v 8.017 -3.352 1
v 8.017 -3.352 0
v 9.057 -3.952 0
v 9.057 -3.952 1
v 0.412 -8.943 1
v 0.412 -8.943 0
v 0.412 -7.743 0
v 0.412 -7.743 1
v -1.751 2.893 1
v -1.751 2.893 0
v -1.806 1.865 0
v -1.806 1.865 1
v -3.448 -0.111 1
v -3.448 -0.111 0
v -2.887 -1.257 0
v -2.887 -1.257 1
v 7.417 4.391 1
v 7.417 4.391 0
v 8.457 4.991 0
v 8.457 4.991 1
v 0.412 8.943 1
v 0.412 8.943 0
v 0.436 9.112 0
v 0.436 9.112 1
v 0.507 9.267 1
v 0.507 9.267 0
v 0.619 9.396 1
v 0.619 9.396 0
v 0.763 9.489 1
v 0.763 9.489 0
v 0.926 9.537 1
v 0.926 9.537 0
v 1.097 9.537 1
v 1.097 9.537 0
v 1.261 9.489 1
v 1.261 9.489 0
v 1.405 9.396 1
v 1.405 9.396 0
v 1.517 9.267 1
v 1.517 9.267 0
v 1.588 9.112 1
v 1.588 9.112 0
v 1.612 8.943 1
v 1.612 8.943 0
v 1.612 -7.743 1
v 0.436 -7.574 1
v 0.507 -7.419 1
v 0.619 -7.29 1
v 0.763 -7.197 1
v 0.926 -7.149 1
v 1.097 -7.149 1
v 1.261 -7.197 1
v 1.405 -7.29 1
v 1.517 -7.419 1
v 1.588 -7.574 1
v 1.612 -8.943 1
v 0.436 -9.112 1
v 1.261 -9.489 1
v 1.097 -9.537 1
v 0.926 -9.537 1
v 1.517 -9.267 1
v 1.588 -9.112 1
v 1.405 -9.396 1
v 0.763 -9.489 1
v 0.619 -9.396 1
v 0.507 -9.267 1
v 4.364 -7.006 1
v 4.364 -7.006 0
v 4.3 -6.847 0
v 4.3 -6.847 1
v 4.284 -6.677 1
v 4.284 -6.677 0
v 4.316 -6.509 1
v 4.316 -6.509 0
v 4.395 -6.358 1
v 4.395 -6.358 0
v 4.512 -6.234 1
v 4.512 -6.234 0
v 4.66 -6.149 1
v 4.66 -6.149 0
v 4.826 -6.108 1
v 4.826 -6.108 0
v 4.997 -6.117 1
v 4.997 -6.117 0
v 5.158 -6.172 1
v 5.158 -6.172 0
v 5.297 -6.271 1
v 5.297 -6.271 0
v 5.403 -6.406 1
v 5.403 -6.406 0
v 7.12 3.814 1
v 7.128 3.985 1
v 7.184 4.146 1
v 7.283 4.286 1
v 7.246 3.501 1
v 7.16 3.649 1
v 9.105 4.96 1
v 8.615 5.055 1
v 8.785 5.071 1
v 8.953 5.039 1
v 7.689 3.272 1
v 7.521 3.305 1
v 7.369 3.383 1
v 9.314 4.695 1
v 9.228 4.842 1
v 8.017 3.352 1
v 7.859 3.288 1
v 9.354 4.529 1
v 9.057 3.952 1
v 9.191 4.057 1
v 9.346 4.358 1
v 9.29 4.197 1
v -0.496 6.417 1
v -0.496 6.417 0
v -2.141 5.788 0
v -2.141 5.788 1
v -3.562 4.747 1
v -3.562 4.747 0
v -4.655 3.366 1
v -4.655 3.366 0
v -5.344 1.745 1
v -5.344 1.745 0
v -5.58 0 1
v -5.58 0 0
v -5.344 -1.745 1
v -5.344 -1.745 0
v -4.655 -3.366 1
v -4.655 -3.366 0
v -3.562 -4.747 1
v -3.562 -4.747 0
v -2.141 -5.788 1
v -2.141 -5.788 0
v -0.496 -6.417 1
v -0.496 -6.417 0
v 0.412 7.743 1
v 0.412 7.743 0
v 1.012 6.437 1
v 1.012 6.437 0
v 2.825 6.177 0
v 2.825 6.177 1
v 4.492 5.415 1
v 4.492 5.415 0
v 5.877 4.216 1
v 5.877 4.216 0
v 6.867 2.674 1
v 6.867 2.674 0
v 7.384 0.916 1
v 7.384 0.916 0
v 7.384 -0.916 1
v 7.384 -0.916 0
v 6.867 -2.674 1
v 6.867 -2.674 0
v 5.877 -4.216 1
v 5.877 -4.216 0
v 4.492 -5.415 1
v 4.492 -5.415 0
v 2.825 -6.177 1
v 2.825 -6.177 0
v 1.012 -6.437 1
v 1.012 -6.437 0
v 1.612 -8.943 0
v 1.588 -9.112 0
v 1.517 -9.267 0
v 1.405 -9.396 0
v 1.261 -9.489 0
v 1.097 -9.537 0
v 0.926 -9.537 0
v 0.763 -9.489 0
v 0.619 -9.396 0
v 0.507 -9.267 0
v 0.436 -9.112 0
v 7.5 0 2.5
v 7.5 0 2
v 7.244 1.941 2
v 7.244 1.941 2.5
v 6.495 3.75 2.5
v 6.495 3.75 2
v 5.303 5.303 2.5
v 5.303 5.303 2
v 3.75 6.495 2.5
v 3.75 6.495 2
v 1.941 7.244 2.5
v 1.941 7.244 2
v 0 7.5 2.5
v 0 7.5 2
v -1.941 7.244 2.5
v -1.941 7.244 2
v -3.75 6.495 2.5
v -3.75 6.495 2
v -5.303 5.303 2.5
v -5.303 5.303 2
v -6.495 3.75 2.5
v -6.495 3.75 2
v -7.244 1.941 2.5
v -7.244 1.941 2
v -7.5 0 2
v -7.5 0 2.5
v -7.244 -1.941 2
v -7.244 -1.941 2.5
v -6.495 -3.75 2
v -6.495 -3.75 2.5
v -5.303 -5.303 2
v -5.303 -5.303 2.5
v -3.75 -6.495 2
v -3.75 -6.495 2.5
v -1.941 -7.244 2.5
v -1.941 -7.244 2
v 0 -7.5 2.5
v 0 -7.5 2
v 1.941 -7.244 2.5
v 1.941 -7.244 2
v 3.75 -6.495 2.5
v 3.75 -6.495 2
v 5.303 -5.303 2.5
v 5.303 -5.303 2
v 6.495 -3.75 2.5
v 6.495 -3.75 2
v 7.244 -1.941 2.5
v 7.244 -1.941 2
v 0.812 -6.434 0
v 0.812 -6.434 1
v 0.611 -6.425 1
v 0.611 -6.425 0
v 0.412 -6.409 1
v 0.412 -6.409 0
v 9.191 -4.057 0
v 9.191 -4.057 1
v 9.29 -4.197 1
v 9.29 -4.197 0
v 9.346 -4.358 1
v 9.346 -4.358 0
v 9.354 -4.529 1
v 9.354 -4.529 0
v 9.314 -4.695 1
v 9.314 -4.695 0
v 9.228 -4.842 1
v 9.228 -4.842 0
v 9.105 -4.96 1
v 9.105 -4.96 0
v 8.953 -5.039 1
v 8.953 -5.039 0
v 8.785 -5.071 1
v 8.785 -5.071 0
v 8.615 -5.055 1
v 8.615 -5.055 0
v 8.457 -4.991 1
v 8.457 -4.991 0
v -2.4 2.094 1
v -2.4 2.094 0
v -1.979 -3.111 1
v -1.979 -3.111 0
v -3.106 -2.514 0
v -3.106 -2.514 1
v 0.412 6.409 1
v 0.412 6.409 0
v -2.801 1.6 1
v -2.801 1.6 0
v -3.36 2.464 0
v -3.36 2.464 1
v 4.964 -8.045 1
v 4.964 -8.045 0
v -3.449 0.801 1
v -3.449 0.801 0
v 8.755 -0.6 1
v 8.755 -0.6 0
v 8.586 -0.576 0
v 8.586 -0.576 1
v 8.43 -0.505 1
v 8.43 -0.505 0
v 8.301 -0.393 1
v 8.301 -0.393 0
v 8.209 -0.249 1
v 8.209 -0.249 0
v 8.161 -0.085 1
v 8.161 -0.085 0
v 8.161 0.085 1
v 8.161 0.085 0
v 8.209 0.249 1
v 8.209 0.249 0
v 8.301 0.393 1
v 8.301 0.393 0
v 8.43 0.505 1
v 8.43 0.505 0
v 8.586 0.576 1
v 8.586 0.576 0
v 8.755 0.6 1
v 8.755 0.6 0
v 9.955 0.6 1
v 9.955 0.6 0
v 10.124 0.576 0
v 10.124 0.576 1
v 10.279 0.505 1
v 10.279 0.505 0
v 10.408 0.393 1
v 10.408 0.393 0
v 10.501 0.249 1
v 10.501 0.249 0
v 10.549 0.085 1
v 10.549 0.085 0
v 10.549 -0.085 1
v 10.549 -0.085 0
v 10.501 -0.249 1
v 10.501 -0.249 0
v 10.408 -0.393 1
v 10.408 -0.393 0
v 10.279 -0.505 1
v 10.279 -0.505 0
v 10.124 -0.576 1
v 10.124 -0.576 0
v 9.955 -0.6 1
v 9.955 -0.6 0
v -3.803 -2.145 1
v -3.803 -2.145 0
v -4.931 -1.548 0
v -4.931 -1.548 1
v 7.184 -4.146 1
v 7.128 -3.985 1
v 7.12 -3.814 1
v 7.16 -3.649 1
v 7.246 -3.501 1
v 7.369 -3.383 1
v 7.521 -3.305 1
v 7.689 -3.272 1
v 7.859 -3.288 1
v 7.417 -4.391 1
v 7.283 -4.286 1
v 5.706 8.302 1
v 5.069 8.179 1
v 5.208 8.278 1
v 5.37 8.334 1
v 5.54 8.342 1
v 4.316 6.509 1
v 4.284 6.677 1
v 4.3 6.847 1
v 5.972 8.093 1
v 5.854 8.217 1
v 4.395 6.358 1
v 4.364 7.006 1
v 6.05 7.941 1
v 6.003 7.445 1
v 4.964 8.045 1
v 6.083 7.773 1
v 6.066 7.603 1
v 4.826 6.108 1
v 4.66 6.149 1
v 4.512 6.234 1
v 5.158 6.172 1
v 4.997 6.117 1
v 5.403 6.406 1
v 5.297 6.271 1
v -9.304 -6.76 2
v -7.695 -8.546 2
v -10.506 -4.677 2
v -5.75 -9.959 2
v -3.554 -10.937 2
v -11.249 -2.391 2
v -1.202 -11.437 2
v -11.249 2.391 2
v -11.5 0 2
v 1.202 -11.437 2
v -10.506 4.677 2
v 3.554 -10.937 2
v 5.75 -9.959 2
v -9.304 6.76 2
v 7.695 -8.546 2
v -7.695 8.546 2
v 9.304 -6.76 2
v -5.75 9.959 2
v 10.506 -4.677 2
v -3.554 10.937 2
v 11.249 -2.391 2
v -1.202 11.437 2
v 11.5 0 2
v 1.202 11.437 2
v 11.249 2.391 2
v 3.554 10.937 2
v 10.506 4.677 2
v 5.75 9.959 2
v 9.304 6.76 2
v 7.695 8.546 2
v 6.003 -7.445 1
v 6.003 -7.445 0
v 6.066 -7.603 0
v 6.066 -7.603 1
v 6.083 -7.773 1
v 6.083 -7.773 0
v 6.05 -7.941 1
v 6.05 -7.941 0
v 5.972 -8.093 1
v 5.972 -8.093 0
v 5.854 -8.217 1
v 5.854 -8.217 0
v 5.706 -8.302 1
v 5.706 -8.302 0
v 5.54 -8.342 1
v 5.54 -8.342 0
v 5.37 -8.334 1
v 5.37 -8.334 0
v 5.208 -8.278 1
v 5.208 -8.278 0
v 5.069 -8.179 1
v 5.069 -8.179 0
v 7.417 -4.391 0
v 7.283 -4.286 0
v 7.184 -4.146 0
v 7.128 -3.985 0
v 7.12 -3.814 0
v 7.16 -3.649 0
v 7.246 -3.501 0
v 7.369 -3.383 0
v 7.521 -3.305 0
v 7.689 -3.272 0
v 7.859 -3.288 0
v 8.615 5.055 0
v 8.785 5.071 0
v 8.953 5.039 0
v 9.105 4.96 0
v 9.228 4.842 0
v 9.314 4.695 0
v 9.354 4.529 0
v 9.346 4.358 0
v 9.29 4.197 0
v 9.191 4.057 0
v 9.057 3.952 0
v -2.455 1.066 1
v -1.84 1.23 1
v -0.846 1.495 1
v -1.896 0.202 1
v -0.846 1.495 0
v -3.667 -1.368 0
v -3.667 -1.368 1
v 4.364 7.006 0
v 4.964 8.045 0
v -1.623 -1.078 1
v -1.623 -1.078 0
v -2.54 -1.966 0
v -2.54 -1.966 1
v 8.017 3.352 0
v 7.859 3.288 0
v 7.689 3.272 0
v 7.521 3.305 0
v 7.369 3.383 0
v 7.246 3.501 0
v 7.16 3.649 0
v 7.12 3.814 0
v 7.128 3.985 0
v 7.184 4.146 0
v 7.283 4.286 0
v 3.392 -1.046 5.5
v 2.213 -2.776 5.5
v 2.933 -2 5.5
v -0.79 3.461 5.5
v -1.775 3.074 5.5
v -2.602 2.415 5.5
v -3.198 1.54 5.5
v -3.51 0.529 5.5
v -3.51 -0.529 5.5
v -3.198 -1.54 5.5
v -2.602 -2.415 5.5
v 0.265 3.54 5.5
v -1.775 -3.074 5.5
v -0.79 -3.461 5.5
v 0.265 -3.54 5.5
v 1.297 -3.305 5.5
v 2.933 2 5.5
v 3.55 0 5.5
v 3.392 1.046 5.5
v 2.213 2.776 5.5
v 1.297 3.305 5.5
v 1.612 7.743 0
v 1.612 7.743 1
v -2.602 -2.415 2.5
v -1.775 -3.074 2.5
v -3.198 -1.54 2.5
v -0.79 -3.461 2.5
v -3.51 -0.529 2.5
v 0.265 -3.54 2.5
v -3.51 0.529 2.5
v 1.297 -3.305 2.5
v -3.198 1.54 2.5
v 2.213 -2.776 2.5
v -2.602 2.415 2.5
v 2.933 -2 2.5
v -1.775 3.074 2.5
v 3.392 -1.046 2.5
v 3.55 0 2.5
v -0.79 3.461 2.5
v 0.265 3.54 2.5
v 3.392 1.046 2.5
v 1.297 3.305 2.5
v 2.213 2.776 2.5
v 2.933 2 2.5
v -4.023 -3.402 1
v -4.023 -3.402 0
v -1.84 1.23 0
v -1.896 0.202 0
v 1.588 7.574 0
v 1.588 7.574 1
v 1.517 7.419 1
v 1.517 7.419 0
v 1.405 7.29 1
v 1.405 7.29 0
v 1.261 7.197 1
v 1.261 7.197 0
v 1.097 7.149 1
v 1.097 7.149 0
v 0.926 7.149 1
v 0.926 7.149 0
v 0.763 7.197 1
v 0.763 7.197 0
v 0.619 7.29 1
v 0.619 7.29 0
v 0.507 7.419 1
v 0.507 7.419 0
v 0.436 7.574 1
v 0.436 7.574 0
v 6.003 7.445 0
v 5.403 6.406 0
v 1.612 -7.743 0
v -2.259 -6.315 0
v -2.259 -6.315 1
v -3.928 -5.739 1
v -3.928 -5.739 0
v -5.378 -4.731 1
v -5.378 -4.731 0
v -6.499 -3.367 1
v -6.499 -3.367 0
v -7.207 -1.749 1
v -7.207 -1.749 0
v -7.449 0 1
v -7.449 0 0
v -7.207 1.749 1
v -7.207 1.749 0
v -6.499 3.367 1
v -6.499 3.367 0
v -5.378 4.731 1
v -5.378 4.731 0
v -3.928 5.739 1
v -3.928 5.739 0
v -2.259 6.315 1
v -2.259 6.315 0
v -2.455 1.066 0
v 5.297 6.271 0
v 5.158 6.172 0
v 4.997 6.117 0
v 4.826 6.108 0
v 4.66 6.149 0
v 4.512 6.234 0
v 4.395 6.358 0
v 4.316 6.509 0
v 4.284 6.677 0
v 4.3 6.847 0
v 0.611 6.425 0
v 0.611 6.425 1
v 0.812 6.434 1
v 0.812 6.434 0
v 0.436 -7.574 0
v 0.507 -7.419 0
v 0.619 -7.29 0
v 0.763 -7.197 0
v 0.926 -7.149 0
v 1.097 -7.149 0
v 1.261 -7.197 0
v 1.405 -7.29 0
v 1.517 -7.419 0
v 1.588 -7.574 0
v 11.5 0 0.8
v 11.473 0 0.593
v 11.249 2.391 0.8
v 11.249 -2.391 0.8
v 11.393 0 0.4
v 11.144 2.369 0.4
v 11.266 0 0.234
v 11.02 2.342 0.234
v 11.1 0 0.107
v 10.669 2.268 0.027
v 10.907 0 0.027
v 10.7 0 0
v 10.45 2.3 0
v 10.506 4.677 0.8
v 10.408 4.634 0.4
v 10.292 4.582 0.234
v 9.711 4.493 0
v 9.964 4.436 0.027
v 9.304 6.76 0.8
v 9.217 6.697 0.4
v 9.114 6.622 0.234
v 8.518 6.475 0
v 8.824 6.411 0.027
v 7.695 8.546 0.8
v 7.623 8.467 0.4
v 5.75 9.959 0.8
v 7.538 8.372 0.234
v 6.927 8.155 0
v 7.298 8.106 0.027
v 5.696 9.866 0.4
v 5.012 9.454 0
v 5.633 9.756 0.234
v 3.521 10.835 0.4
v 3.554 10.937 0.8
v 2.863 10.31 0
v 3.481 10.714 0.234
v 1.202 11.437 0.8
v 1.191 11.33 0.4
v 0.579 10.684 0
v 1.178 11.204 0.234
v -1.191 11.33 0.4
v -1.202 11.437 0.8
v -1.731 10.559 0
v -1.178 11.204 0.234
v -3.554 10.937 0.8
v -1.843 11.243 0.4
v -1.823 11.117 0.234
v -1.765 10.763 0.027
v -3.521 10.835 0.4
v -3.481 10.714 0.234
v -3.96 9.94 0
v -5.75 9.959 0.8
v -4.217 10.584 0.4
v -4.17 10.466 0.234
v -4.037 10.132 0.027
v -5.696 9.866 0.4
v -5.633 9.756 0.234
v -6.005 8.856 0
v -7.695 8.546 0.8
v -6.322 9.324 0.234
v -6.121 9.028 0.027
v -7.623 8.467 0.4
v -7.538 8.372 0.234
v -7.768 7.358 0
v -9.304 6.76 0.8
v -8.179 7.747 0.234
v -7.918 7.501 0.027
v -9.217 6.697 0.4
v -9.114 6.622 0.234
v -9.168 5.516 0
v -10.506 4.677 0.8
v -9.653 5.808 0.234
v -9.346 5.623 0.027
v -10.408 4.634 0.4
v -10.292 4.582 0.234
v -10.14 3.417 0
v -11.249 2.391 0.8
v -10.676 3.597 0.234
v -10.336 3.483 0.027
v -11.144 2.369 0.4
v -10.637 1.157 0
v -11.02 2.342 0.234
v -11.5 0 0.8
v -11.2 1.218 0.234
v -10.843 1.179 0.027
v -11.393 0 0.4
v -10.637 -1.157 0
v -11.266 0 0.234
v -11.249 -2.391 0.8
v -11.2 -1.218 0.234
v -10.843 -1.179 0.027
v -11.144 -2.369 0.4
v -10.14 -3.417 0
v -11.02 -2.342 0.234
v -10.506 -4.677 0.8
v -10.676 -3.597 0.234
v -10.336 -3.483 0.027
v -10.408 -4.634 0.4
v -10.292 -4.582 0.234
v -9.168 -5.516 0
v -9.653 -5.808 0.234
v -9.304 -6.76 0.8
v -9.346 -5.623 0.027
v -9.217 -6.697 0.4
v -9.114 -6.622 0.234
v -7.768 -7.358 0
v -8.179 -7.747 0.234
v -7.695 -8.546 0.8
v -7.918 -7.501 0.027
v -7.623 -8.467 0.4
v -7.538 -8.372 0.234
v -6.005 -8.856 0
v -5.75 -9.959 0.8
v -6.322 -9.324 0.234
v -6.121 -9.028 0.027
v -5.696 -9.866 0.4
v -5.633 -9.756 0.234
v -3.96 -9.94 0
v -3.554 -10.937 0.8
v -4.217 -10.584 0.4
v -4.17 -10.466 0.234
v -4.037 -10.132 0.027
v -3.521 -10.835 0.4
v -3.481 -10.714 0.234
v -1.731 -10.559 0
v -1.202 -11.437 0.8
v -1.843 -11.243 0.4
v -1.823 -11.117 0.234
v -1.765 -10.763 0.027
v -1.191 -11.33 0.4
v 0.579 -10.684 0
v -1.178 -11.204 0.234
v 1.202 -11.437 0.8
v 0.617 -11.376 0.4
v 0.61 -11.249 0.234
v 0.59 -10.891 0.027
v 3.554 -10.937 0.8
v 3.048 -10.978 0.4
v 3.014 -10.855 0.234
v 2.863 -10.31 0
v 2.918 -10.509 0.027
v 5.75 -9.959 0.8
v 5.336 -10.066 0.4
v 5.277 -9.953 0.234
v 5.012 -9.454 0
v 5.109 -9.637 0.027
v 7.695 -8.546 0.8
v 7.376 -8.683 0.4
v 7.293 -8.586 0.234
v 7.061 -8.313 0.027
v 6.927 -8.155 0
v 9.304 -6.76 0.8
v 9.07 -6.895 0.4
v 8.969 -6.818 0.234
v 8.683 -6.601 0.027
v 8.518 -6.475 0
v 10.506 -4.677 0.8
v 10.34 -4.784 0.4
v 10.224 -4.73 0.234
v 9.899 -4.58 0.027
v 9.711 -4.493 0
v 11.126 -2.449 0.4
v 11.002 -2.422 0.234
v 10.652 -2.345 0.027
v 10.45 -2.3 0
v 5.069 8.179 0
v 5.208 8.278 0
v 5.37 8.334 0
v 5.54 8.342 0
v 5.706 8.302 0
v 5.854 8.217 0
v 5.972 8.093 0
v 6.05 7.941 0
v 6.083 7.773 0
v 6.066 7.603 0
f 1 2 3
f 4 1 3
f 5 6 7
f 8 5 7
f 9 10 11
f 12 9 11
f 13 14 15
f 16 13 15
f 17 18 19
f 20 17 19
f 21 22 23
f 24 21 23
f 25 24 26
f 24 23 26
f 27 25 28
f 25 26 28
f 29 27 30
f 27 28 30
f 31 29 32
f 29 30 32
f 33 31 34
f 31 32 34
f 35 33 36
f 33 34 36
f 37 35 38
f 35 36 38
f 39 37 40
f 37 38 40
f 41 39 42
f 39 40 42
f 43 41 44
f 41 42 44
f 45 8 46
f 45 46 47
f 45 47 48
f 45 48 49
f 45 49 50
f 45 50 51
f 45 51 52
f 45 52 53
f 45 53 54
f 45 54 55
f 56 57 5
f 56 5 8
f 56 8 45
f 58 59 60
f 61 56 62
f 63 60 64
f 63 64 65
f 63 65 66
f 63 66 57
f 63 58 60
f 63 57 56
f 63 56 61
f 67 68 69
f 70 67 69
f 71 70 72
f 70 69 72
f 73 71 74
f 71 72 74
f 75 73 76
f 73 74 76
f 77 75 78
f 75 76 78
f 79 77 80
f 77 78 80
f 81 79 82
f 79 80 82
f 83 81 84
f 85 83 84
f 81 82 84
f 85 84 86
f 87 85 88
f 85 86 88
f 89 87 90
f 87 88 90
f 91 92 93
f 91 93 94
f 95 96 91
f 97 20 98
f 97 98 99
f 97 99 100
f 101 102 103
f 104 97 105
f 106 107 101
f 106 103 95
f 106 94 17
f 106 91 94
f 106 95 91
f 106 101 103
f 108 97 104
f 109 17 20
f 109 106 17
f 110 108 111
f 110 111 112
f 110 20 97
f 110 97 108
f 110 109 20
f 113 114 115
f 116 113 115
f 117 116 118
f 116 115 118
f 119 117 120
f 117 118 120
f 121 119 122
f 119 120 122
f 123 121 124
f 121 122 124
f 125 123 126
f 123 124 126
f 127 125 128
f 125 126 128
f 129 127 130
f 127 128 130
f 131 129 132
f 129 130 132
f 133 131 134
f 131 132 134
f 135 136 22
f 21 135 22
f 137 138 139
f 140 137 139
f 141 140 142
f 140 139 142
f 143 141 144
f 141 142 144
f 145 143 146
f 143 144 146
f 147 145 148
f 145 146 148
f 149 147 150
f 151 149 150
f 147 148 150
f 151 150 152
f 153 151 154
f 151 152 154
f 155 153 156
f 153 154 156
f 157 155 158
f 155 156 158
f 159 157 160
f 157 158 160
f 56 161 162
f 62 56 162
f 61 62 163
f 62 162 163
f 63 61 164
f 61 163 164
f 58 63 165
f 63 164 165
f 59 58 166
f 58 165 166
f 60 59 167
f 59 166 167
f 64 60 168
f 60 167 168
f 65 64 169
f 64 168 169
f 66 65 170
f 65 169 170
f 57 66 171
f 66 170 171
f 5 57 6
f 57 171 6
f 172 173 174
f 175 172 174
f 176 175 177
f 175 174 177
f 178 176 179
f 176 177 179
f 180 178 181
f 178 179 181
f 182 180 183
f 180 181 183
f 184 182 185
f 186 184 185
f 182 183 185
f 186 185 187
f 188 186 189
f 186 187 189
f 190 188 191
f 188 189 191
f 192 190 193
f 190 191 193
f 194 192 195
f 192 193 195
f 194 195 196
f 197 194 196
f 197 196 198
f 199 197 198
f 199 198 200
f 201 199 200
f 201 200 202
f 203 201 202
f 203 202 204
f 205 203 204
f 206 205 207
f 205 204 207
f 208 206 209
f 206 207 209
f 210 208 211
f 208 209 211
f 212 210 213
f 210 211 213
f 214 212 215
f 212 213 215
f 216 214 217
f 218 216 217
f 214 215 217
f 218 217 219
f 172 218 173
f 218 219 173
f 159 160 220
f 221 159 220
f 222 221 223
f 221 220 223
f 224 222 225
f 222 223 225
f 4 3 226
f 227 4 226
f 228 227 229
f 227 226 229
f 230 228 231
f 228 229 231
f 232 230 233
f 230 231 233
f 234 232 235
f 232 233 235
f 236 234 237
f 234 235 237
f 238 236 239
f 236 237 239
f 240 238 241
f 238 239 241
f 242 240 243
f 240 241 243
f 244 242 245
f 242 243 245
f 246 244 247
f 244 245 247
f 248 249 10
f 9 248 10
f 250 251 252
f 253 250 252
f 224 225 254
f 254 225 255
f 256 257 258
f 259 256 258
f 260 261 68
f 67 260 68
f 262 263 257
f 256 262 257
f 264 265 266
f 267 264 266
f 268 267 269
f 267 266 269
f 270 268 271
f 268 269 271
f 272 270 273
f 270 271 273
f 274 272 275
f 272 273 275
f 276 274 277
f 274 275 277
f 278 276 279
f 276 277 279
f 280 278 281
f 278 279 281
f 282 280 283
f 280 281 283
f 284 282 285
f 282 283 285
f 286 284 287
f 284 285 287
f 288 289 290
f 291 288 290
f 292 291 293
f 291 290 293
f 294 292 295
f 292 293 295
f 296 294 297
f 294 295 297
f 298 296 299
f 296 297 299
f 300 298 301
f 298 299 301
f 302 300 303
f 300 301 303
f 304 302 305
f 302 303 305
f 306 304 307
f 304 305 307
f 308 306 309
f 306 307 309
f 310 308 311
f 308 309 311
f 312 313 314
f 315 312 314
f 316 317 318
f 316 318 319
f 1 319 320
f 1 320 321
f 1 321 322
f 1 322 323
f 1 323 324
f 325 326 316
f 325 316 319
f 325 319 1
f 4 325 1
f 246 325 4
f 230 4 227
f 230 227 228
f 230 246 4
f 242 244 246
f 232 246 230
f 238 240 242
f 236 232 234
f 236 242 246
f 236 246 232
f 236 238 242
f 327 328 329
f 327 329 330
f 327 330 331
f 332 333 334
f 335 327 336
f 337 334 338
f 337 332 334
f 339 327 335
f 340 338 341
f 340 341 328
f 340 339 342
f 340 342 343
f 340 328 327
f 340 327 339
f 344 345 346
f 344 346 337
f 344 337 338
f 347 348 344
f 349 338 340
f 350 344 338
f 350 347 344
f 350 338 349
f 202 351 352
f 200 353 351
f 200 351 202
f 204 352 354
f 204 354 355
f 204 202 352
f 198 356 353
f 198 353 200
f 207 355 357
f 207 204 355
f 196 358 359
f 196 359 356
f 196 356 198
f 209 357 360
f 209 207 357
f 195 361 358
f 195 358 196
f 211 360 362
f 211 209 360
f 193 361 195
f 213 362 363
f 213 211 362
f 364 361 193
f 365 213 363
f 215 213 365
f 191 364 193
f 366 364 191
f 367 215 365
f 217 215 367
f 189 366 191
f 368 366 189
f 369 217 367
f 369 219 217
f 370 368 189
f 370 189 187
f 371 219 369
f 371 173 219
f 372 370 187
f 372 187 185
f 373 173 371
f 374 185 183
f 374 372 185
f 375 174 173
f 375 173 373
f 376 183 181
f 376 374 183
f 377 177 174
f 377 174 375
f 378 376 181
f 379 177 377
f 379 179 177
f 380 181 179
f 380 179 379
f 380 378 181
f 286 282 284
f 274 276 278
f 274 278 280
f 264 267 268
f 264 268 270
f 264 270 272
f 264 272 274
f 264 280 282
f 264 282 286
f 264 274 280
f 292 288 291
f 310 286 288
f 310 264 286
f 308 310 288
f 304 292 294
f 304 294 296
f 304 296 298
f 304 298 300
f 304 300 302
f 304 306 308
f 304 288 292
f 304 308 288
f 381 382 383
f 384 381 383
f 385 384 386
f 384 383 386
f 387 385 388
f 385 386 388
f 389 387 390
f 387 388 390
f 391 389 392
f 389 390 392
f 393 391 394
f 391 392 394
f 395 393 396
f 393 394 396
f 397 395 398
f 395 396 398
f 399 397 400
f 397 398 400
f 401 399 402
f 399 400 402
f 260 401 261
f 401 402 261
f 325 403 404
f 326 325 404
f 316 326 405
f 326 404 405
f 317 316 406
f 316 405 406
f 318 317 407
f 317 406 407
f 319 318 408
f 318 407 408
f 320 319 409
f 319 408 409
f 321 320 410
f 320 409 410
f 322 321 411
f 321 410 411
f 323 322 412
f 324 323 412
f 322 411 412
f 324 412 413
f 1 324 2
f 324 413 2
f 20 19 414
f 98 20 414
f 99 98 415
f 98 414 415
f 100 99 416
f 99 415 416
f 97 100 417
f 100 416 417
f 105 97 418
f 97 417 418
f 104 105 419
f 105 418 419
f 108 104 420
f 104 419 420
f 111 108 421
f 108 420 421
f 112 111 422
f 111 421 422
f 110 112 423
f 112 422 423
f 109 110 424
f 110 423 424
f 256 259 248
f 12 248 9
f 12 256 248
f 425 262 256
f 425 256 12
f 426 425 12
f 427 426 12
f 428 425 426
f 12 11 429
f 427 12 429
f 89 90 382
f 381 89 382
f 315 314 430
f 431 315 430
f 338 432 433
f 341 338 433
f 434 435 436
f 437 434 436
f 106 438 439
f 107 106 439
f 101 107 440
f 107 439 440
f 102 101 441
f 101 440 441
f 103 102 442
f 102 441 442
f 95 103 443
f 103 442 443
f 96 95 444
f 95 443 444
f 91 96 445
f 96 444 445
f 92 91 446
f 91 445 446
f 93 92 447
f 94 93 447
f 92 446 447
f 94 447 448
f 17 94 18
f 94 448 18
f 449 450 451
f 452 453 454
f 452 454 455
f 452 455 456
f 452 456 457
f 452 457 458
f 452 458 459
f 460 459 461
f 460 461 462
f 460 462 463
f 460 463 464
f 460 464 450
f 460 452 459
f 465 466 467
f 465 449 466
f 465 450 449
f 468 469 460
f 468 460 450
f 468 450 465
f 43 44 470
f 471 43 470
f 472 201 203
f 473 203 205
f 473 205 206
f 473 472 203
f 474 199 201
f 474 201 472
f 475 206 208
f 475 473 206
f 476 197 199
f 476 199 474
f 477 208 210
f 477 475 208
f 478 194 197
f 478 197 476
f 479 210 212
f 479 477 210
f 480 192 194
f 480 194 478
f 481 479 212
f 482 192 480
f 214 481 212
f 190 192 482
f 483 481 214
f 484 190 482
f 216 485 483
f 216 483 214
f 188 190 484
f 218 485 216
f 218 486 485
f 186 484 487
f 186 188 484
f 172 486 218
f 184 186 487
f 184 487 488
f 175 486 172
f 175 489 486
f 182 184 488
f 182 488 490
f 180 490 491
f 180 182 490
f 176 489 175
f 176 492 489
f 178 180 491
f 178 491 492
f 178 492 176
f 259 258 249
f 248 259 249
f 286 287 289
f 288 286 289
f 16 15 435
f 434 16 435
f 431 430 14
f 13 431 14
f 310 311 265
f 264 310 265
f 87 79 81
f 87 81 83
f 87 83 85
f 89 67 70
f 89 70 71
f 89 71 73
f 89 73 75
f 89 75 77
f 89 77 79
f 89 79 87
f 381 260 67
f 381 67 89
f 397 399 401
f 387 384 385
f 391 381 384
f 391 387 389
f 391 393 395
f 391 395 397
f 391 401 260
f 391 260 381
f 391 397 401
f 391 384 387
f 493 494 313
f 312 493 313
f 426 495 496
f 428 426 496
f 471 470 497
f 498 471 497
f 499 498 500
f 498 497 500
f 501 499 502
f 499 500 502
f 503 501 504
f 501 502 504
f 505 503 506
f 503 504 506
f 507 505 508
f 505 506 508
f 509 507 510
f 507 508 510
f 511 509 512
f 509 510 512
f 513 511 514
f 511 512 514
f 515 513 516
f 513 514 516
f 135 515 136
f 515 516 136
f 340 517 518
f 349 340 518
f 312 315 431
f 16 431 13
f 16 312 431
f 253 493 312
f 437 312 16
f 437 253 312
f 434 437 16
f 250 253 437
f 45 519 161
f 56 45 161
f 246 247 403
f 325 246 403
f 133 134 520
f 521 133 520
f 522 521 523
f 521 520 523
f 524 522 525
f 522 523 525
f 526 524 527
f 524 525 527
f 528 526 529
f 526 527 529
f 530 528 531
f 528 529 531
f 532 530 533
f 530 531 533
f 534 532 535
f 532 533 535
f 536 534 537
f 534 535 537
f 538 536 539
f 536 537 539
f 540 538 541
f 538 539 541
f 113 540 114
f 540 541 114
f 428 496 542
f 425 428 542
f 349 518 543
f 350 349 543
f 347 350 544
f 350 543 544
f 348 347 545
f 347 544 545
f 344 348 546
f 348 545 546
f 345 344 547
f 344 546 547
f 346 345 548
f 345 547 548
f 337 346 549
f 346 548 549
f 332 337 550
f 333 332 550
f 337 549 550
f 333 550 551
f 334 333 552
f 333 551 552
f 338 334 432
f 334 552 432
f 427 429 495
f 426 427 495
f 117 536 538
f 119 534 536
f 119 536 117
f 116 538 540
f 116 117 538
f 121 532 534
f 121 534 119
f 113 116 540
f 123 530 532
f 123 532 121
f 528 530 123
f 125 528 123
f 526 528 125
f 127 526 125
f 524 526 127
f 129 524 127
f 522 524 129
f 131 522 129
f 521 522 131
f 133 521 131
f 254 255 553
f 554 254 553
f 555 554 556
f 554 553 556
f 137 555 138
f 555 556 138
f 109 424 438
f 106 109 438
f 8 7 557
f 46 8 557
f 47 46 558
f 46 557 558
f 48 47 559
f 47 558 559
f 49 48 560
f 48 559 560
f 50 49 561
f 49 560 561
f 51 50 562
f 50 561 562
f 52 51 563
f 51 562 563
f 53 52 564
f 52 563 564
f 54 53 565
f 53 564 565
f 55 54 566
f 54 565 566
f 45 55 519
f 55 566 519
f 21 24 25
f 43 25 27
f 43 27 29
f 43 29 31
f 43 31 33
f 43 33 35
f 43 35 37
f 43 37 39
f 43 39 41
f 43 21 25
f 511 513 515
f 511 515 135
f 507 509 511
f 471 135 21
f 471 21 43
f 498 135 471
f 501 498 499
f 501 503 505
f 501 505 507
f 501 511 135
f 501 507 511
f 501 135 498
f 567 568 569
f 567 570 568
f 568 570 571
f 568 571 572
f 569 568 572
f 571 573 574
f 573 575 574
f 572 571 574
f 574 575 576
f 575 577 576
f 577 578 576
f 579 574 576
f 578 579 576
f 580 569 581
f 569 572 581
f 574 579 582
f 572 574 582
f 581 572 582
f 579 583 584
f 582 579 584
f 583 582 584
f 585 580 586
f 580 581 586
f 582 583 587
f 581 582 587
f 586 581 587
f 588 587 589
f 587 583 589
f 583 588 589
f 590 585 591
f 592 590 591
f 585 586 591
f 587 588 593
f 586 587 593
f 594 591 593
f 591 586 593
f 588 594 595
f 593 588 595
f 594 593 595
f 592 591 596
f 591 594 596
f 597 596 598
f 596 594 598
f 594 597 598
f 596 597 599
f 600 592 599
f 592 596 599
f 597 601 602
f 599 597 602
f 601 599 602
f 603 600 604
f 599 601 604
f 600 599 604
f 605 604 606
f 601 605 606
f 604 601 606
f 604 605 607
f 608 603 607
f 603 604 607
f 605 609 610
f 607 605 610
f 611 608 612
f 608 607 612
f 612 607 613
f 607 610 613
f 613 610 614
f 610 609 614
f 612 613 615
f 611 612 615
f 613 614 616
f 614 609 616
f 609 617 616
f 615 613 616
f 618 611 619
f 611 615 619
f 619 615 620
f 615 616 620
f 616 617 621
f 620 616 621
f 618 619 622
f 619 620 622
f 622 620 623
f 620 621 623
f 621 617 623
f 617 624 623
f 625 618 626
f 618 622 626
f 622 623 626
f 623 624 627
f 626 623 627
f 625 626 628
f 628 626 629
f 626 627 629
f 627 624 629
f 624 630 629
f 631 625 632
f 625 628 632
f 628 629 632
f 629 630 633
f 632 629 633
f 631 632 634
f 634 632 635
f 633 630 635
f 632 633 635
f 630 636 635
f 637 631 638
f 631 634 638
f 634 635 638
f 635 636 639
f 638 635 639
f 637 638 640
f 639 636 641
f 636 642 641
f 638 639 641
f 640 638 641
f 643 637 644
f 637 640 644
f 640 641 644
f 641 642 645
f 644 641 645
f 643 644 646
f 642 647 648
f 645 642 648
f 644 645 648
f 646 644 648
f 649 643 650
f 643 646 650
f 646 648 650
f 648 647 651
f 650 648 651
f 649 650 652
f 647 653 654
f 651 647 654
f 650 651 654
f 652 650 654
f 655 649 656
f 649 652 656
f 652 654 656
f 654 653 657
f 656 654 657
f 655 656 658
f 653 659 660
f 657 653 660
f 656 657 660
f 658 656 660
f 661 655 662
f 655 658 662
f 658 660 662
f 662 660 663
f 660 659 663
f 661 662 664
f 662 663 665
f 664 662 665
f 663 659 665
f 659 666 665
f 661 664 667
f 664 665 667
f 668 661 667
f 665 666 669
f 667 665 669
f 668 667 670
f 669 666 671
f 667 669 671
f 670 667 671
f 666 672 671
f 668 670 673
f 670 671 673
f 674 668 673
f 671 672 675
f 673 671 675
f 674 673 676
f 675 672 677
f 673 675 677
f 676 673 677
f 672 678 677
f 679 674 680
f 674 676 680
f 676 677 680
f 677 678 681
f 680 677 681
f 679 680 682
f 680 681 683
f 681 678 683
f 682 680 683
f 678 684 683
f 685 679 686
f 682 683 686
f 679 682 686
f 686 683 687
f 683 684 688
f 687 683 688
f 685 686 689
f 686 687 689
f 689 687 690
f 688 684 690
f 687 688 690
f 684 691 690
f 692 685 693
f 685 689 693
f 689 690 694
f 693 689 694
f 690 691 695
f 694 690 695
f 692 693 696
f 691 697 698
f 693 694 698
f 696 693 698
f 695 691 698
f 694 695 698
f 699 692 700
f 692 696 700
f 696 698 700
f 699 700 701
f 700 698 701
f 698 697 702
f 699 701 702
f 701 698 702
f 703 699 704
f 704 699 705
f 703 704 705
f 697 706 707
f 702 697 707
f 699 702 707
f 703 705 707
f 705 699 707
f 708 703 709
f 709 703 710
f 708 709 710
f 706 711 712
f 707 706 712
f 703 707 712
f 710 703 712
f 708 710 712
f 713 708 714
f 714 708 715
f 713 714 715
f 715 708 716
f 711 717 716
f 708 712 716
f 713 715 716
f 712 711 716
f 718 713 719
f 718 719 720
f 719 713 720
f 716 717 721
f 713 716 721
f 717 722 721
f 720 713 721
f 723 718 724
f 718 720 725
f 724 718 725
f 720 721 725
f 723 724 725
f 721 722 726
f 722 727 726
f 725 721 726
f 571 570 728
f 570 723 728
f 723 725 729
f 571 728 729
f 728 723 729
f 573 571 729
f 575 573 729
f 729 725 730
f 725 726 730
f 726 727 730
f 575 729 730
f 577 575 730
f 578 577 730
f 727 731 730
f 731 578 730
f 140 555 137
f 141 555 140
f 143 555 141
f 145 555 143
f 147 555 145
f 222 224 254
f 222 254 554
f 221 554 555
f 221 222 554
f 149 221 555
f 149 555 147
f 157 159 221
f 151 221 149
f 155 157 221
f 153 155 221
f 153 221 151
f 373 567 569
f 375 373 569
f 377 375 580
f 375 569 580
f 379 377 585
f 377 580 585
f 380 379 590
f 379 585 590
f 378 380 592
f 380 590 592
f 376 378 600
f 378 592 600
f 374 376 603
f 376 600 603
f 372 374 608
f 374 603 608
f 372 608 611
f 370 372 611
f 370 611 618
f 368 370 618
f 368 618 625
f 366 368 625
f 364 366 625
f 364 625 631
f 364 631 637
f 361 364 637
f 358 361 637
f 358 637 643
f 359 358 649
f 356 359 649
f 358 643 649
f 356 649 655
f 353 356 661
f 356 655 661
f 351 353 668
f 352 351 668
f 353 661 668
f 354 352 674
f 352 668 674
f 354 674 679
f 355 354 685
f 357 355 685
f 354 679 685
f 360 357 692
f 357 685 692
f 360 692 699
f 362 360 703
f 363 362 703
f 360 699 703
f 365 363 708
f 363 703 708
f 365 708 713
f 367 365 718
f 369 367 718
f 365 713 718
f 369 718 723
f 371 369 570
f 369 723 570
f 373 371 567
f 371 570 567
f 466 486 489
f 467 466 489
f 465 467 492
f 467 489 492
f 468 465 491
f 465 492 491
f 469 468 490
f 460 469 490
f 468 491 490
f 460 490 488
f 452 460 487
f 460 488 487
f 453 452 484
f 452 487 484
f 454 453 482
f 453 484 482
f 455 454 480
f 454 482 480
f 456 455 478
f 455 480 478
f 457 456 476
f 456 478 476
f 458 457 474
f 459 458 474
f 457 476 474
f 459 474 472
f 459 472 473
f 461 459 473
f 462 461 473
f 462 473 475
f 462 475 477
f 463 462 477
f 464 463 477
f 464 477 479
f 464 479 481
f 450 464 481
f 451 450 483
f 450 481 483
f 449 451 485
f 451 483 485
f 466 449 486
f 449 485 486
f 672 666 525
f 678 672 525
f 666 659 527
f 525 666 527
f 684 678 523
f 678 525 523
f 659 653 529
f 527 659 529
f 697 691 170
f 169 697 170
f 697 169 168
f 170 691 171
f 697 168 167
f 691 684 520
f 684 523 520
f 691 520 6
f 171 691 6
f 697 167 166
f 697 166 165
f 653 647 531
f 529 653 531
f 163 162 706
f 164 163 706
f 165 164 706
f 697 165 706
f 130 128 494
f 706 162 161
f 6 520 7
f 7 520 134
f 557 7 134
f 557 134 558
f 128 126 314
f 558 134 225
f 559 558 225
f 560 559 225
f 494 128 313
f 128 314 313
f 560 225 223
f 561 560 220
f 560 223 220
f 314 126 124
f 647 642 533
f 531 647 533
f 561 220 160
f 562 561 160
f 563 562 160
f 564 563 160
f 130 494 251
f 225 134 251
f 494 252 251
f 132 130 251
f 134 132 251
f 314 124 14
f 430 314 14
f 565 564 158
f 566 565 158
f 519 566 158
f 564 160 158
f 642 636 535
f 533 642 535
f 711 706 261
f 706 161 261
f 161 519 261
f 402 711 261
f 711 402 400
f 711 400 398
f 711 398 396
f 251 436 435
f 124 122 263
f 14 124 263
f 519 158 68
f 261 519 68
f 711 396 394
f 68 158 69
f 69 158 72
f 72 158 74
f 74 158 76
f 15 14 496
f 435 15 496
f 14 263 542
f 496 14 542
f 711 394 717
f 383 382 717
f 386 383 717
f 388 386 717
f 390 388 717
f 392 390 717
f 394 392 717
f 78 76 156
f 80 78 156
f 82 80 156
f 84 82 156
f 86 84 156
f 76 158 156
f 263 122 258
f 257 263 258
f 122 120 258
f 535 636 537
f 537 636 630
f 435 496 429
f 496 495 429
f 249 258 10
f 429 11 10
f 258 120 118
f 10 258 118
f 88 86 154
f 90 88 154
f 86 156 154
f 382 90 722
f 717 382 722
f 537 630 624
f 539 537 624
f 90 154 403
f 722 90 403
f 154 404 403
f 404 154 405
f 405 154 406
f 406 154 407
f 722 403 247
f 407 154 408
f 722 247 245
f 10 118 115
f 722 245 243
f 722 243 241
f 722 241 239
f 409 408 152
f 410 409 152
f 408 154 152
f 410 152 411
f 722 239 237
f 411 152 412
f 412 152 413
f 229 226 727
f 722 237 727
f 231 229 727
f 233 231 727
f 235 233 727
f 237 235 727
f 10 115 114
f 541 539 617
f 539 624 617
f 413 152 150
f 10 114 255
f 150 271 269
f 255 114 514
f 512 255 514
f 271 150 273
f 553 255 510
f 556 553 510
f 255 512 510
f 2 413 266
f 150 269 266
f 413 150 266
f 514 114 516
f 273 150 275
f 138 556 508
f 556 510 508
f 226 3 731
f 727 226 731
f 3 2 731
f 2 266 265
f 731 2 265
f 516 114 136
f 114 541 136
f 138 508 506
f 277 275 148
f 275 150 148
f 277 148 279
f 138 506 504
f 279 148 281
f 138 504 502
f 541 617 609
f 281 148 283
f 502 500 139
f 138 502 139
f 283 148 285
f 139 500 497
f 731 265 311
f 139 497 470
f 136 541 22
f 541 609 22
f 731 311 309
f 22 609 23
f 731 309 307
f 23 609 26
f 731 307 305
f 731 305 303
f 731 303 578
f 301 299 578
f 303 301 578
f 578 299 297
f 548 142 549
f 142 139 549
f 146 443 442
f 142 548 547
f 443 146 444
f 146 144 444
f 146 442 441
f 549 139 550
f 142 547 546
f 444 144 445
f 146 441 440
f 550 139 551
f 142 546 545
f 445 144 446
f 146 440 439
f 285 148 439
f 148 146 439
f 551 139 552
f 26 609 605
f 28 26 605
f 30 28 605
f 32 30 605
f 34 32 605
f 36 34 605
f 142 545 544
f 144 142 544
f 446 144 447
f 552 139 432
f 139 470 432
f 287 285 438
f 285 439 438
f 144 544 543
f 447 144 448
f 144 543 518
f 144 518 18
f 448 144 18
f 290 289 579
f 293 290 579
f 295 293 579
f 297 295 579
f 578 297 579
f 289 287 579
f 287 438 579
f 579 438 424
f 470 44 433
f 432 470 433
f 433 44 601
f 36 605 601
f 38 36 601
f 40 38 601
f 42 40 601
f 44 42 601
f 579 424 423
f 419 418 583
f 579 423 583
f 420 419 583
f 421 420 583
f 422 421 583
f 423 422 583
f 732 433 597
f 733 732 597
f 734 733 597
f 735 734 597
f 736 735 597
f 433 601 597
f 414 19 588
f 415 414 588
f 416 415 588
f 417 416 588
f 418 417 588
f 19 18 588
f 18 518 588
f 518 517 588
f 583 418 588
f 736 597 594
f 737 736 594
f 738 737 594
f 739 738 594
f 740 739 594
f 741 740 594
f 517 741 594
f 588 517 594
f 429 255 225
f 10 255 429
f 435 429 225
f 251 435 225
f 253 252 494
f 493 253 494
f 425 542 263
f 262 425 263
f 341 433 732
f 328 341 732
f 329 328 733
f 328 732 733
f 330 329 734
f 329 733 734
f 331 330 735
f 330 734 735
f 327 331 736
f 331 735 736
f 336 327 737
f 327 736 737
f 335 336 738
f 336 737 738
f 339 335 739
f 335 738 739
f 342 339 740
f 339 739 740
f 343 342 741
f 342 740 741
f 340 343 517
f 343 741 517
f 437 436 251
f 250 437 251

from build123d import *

# Parameters (mm, degrees)
F0_R     = 11.5
F1_DEPTH = 2
F2_R     = 7.5
F3_DEPTH = 0.5
F4_R     = 3.55
F5_DEPTH = 3
F7_DEPTH = 1
F8_R     = 0.8


with BuildPart() as f1:
    # F0 (on Top) → F1 (new body)
    with BuildSketch(Plane.XY):
        Circle(F0_R)
    extrude(amount=F1_DEPTH)

    # F2 (on face) → F3 (join)
    with BuildSketch(Plane.XY.offset(2)):
        Circle(F2_R)
    extrude(amount=F3_DEPTH)

    # F4 (on face) → F5 (join)
    with BuildSketch(Plane.XY.offset(2.5)):
        Circle(F4_R)
    extrude(amount=F5_DEPTH)

    # F6 (on face) → F7 (cut)
    with BuildSketch(Plane(origin=(0, 0, 0), x_dir=(1, 0, 0), z_dir=(0, 0, -1))):
        with BuildLine():
            ThreePointArc((-0.4961662294, -6.4166546046), (-5.5796541594, 0), (-0.4961662294, 6.4166546046))
            ThreePointArc((-0.4961662294, 6.4166546046), (-7.4491550771, 0), (-0.4961662294, -6.4166546046))
        make_face()
        with BuildLine():
            Line((1.6118148057, 7.7430446076), (1.6118148057, 8.9430446076))
            ThreePointArc((1.6118148057, 8.9430446076), (1.0118148057, 9.5430446076), (0.4118148057, 8.9430446076))
            Line((0.4118148057, 8.9430446076), (0.4118148057, 7.7430446076))
            ThreePointArc((0.4118148057, 7.7430446076), (1.0118148057, 7.1430446076), (1.6118148057, 7.7430446076))
        make_face()
        with BuildLine():
            ThreePointArc((1.6118148057, -7.7430446076), (1.0118148057, -7.1430446076), (0.4118148057, -7.7430446076))
            Line((0.4118148057, -7.7430446076), (0.4118148057, -8.9430446076))
            ThreePointArc((0.4118148057, -8.9430446076), (1.0118148057, -9.5430446076), (1.6118148057, -8.9430446076))
            Line((1.6118148057, -8.9430446076), (1.6118148057, -7.7430446076))
        make_face()
        with BuildLine():
            ThreePointArc((1.0118148057, 6.4373402714), (0.7114877838, 6.4303307418), (0.4118148057, 6.4093174184))
            Line((0.4118148057, 6.4093174184), (0.4118148057, -6.4093174184))
            ThreePointArc((0.4118148057, -6.4093174184), (0.7114877838, -6.4303307418), (1.0118148057, -6.4373402714))
            Line((1.0118148057, -6.4373402714), (1.0118148057, 6.4373402714))
        make_face()
        with BuildLine():
            ThreePointArc((1.0118148057, -6.4373402714), (7.4491550771, 0), (1.0118148057, 6.4373402714))
            Line((1.0118148057, 6.4373402714), (1.0118148057, -6.4373402714))
        make_face()
        with BuildLine():
            Line((4.9637218672, 8.0449038174), (4.3637218672, 7.0056733328))
            ThreePointArc((4.3637218672, 7.0056733328), (4.5833371095, 6.1860580905), (5.4029523517, 6.4056733328))
            Line((5.4029523517, 6.4056733328), (6.0029523517, 7.4449038174))
            ThreePointArc((6.0029523517, 7.4449038174), (5.7833371095, 8.2645190596), (4.9637218672, 8.0449038174))
        make_face()
        with BuildLine():
            Line((8.456718623, 4.9911375461), (7.4174881385, 4.3911375461))
            ThreePointArc((7.4174881385, 4.3911375461), (7.1978728962, 3.5715223038), (8.0174881385, 3.3519070615))
            Line((8.0174881385, 3.3519070615), (9.056718623, 3.9519070615))
            ThreePointArc((9.056718623, 3.9519070615), (9.2763338653, 4.7715223038), (8.456718623, 4.9911375461))
        make_face()
        with BuildLine():
            Line((9.9548594133, 0.6), (8.7548594133, 0.6))
            ThreePointArc((8.7548594133, 0.6), (8.1548594133, 0), (8.7548594133, -0.6))
            Line((8.7548594133, -0.6), (9.9548594133, -0.6))
            ThreePointArc((9.9548594133, -0.6), (10.5548594133, 0), (9.9548594133, 0.6))
        make_face()
        with BuildLine():
            Line((9.056718623, -3.9519070615), (8.0174881385, -3.3519070615))
            ThreePointArc((8.0174881385, -3.3519070615), (7.1978728962, -3.5715223038), (7.4174881385, -4.3911375461))
            Line((7.4174881385, -4.3911375461), (8.456718623, -4.9911375461))
            ThreePointArc((8.456718623, -4.9911375461), (9.2763338653, -4.7715223038), (9.056718623, -3.9519070615))
        make_face()
        with BuildLine():
            Line((6.0029523517, -7.4449038174), (5.4029523517, -6.4056733328))
            ThreePointArc((5.4029523517, -6.4056733328), (4.5833371095, -6.1860580905), (4.3637218672, -7.0056733328))
            Line((4.3637218672, -7.0056733328), (4.9637218672, -8.0449038174))
            ThreePointArc((4.9637218672, -8.0449038174), (5.7833371095, -8.2645190596), (6.0029523517, -7.4449038174))
        make_face()
        Polygon((-3.8030603375, 2.1452946133), (-4.9306933834, 1.548157713), (-3.6674308223, 1.368445539), align=None)
        Polygon((-4.022513503, 3.4022628198), (-3.8030603375, 2.1452946133), (-3.1061447883, 2.5143455137), align=None)
        Polygon((-3.1061447883, 2.5143455137), (-3.8030603375, 2.1452946133), (-3.6674308223, 1.368445539), (-2.8866916228, 1.2573773072), (-2.5397977764, 1.9655824393), align=None)
        Polygon((-2.8866916228, 1.2573773072), (-3.6674308223, 1.368445539), (-3.4479776567, 0.1114773325), align=None)
        Polygon((-1.9785117424, 3.1114824139), (-3.1061447883, 2.5143455137), (-2.5397977764, 1.9655824393), align=None)
        Polygon((-2.5397977764, 1.9655824393), (-2.8866916228, 1.2573773072), (-1.6234290616, 1.0776651331), align=None)
        Polygon((-2.8006232783, -1.6000521775), (-3.3599715105, -2.463868964), (-2.3997105171, -2.0938031454), align=None)
        Polygon((-3.4493137525, -0.8011463294), (-2.8006232783, -1.6000521775), (-2.4549270593, -1.0661840434), align=None)
        Polygon((-2.4549270593, -1.0661840434), (-2.8006232783, -1.6000521775), (-2.3997105171, -2.0938031454), (-1.8062365852, -1.8650898915), (-1.840362285, -1.2299863589), align=None)
        Polygon((-1.8062365852, -1.8650898915), (-2.3997105171, -2.0938031454), (-1.7510200429, -2.8927089935), align=None)
        Polygon((-1.8955788272, -0.2023672569), (-2.4549270593, -1.0661840434), (-1.840362285, -1.2299863589), align=None)
        Polygon((-1.840362285, -1.2299863589), (-1.8062365852, -1.8650898915), (-0.8459755918, -1.4950240729), align=None)
    extrude(amount=-F7_DEPTH, mode=Mode.SUBTRACT)

    # F8
    f8_edges = [f1.edges().sort_by_distance(p)[0] for p in [
        (-11.5, 0, 0),
    ]]
    fillet(f8_edges, radius=F8_R)


solid = f1.part
